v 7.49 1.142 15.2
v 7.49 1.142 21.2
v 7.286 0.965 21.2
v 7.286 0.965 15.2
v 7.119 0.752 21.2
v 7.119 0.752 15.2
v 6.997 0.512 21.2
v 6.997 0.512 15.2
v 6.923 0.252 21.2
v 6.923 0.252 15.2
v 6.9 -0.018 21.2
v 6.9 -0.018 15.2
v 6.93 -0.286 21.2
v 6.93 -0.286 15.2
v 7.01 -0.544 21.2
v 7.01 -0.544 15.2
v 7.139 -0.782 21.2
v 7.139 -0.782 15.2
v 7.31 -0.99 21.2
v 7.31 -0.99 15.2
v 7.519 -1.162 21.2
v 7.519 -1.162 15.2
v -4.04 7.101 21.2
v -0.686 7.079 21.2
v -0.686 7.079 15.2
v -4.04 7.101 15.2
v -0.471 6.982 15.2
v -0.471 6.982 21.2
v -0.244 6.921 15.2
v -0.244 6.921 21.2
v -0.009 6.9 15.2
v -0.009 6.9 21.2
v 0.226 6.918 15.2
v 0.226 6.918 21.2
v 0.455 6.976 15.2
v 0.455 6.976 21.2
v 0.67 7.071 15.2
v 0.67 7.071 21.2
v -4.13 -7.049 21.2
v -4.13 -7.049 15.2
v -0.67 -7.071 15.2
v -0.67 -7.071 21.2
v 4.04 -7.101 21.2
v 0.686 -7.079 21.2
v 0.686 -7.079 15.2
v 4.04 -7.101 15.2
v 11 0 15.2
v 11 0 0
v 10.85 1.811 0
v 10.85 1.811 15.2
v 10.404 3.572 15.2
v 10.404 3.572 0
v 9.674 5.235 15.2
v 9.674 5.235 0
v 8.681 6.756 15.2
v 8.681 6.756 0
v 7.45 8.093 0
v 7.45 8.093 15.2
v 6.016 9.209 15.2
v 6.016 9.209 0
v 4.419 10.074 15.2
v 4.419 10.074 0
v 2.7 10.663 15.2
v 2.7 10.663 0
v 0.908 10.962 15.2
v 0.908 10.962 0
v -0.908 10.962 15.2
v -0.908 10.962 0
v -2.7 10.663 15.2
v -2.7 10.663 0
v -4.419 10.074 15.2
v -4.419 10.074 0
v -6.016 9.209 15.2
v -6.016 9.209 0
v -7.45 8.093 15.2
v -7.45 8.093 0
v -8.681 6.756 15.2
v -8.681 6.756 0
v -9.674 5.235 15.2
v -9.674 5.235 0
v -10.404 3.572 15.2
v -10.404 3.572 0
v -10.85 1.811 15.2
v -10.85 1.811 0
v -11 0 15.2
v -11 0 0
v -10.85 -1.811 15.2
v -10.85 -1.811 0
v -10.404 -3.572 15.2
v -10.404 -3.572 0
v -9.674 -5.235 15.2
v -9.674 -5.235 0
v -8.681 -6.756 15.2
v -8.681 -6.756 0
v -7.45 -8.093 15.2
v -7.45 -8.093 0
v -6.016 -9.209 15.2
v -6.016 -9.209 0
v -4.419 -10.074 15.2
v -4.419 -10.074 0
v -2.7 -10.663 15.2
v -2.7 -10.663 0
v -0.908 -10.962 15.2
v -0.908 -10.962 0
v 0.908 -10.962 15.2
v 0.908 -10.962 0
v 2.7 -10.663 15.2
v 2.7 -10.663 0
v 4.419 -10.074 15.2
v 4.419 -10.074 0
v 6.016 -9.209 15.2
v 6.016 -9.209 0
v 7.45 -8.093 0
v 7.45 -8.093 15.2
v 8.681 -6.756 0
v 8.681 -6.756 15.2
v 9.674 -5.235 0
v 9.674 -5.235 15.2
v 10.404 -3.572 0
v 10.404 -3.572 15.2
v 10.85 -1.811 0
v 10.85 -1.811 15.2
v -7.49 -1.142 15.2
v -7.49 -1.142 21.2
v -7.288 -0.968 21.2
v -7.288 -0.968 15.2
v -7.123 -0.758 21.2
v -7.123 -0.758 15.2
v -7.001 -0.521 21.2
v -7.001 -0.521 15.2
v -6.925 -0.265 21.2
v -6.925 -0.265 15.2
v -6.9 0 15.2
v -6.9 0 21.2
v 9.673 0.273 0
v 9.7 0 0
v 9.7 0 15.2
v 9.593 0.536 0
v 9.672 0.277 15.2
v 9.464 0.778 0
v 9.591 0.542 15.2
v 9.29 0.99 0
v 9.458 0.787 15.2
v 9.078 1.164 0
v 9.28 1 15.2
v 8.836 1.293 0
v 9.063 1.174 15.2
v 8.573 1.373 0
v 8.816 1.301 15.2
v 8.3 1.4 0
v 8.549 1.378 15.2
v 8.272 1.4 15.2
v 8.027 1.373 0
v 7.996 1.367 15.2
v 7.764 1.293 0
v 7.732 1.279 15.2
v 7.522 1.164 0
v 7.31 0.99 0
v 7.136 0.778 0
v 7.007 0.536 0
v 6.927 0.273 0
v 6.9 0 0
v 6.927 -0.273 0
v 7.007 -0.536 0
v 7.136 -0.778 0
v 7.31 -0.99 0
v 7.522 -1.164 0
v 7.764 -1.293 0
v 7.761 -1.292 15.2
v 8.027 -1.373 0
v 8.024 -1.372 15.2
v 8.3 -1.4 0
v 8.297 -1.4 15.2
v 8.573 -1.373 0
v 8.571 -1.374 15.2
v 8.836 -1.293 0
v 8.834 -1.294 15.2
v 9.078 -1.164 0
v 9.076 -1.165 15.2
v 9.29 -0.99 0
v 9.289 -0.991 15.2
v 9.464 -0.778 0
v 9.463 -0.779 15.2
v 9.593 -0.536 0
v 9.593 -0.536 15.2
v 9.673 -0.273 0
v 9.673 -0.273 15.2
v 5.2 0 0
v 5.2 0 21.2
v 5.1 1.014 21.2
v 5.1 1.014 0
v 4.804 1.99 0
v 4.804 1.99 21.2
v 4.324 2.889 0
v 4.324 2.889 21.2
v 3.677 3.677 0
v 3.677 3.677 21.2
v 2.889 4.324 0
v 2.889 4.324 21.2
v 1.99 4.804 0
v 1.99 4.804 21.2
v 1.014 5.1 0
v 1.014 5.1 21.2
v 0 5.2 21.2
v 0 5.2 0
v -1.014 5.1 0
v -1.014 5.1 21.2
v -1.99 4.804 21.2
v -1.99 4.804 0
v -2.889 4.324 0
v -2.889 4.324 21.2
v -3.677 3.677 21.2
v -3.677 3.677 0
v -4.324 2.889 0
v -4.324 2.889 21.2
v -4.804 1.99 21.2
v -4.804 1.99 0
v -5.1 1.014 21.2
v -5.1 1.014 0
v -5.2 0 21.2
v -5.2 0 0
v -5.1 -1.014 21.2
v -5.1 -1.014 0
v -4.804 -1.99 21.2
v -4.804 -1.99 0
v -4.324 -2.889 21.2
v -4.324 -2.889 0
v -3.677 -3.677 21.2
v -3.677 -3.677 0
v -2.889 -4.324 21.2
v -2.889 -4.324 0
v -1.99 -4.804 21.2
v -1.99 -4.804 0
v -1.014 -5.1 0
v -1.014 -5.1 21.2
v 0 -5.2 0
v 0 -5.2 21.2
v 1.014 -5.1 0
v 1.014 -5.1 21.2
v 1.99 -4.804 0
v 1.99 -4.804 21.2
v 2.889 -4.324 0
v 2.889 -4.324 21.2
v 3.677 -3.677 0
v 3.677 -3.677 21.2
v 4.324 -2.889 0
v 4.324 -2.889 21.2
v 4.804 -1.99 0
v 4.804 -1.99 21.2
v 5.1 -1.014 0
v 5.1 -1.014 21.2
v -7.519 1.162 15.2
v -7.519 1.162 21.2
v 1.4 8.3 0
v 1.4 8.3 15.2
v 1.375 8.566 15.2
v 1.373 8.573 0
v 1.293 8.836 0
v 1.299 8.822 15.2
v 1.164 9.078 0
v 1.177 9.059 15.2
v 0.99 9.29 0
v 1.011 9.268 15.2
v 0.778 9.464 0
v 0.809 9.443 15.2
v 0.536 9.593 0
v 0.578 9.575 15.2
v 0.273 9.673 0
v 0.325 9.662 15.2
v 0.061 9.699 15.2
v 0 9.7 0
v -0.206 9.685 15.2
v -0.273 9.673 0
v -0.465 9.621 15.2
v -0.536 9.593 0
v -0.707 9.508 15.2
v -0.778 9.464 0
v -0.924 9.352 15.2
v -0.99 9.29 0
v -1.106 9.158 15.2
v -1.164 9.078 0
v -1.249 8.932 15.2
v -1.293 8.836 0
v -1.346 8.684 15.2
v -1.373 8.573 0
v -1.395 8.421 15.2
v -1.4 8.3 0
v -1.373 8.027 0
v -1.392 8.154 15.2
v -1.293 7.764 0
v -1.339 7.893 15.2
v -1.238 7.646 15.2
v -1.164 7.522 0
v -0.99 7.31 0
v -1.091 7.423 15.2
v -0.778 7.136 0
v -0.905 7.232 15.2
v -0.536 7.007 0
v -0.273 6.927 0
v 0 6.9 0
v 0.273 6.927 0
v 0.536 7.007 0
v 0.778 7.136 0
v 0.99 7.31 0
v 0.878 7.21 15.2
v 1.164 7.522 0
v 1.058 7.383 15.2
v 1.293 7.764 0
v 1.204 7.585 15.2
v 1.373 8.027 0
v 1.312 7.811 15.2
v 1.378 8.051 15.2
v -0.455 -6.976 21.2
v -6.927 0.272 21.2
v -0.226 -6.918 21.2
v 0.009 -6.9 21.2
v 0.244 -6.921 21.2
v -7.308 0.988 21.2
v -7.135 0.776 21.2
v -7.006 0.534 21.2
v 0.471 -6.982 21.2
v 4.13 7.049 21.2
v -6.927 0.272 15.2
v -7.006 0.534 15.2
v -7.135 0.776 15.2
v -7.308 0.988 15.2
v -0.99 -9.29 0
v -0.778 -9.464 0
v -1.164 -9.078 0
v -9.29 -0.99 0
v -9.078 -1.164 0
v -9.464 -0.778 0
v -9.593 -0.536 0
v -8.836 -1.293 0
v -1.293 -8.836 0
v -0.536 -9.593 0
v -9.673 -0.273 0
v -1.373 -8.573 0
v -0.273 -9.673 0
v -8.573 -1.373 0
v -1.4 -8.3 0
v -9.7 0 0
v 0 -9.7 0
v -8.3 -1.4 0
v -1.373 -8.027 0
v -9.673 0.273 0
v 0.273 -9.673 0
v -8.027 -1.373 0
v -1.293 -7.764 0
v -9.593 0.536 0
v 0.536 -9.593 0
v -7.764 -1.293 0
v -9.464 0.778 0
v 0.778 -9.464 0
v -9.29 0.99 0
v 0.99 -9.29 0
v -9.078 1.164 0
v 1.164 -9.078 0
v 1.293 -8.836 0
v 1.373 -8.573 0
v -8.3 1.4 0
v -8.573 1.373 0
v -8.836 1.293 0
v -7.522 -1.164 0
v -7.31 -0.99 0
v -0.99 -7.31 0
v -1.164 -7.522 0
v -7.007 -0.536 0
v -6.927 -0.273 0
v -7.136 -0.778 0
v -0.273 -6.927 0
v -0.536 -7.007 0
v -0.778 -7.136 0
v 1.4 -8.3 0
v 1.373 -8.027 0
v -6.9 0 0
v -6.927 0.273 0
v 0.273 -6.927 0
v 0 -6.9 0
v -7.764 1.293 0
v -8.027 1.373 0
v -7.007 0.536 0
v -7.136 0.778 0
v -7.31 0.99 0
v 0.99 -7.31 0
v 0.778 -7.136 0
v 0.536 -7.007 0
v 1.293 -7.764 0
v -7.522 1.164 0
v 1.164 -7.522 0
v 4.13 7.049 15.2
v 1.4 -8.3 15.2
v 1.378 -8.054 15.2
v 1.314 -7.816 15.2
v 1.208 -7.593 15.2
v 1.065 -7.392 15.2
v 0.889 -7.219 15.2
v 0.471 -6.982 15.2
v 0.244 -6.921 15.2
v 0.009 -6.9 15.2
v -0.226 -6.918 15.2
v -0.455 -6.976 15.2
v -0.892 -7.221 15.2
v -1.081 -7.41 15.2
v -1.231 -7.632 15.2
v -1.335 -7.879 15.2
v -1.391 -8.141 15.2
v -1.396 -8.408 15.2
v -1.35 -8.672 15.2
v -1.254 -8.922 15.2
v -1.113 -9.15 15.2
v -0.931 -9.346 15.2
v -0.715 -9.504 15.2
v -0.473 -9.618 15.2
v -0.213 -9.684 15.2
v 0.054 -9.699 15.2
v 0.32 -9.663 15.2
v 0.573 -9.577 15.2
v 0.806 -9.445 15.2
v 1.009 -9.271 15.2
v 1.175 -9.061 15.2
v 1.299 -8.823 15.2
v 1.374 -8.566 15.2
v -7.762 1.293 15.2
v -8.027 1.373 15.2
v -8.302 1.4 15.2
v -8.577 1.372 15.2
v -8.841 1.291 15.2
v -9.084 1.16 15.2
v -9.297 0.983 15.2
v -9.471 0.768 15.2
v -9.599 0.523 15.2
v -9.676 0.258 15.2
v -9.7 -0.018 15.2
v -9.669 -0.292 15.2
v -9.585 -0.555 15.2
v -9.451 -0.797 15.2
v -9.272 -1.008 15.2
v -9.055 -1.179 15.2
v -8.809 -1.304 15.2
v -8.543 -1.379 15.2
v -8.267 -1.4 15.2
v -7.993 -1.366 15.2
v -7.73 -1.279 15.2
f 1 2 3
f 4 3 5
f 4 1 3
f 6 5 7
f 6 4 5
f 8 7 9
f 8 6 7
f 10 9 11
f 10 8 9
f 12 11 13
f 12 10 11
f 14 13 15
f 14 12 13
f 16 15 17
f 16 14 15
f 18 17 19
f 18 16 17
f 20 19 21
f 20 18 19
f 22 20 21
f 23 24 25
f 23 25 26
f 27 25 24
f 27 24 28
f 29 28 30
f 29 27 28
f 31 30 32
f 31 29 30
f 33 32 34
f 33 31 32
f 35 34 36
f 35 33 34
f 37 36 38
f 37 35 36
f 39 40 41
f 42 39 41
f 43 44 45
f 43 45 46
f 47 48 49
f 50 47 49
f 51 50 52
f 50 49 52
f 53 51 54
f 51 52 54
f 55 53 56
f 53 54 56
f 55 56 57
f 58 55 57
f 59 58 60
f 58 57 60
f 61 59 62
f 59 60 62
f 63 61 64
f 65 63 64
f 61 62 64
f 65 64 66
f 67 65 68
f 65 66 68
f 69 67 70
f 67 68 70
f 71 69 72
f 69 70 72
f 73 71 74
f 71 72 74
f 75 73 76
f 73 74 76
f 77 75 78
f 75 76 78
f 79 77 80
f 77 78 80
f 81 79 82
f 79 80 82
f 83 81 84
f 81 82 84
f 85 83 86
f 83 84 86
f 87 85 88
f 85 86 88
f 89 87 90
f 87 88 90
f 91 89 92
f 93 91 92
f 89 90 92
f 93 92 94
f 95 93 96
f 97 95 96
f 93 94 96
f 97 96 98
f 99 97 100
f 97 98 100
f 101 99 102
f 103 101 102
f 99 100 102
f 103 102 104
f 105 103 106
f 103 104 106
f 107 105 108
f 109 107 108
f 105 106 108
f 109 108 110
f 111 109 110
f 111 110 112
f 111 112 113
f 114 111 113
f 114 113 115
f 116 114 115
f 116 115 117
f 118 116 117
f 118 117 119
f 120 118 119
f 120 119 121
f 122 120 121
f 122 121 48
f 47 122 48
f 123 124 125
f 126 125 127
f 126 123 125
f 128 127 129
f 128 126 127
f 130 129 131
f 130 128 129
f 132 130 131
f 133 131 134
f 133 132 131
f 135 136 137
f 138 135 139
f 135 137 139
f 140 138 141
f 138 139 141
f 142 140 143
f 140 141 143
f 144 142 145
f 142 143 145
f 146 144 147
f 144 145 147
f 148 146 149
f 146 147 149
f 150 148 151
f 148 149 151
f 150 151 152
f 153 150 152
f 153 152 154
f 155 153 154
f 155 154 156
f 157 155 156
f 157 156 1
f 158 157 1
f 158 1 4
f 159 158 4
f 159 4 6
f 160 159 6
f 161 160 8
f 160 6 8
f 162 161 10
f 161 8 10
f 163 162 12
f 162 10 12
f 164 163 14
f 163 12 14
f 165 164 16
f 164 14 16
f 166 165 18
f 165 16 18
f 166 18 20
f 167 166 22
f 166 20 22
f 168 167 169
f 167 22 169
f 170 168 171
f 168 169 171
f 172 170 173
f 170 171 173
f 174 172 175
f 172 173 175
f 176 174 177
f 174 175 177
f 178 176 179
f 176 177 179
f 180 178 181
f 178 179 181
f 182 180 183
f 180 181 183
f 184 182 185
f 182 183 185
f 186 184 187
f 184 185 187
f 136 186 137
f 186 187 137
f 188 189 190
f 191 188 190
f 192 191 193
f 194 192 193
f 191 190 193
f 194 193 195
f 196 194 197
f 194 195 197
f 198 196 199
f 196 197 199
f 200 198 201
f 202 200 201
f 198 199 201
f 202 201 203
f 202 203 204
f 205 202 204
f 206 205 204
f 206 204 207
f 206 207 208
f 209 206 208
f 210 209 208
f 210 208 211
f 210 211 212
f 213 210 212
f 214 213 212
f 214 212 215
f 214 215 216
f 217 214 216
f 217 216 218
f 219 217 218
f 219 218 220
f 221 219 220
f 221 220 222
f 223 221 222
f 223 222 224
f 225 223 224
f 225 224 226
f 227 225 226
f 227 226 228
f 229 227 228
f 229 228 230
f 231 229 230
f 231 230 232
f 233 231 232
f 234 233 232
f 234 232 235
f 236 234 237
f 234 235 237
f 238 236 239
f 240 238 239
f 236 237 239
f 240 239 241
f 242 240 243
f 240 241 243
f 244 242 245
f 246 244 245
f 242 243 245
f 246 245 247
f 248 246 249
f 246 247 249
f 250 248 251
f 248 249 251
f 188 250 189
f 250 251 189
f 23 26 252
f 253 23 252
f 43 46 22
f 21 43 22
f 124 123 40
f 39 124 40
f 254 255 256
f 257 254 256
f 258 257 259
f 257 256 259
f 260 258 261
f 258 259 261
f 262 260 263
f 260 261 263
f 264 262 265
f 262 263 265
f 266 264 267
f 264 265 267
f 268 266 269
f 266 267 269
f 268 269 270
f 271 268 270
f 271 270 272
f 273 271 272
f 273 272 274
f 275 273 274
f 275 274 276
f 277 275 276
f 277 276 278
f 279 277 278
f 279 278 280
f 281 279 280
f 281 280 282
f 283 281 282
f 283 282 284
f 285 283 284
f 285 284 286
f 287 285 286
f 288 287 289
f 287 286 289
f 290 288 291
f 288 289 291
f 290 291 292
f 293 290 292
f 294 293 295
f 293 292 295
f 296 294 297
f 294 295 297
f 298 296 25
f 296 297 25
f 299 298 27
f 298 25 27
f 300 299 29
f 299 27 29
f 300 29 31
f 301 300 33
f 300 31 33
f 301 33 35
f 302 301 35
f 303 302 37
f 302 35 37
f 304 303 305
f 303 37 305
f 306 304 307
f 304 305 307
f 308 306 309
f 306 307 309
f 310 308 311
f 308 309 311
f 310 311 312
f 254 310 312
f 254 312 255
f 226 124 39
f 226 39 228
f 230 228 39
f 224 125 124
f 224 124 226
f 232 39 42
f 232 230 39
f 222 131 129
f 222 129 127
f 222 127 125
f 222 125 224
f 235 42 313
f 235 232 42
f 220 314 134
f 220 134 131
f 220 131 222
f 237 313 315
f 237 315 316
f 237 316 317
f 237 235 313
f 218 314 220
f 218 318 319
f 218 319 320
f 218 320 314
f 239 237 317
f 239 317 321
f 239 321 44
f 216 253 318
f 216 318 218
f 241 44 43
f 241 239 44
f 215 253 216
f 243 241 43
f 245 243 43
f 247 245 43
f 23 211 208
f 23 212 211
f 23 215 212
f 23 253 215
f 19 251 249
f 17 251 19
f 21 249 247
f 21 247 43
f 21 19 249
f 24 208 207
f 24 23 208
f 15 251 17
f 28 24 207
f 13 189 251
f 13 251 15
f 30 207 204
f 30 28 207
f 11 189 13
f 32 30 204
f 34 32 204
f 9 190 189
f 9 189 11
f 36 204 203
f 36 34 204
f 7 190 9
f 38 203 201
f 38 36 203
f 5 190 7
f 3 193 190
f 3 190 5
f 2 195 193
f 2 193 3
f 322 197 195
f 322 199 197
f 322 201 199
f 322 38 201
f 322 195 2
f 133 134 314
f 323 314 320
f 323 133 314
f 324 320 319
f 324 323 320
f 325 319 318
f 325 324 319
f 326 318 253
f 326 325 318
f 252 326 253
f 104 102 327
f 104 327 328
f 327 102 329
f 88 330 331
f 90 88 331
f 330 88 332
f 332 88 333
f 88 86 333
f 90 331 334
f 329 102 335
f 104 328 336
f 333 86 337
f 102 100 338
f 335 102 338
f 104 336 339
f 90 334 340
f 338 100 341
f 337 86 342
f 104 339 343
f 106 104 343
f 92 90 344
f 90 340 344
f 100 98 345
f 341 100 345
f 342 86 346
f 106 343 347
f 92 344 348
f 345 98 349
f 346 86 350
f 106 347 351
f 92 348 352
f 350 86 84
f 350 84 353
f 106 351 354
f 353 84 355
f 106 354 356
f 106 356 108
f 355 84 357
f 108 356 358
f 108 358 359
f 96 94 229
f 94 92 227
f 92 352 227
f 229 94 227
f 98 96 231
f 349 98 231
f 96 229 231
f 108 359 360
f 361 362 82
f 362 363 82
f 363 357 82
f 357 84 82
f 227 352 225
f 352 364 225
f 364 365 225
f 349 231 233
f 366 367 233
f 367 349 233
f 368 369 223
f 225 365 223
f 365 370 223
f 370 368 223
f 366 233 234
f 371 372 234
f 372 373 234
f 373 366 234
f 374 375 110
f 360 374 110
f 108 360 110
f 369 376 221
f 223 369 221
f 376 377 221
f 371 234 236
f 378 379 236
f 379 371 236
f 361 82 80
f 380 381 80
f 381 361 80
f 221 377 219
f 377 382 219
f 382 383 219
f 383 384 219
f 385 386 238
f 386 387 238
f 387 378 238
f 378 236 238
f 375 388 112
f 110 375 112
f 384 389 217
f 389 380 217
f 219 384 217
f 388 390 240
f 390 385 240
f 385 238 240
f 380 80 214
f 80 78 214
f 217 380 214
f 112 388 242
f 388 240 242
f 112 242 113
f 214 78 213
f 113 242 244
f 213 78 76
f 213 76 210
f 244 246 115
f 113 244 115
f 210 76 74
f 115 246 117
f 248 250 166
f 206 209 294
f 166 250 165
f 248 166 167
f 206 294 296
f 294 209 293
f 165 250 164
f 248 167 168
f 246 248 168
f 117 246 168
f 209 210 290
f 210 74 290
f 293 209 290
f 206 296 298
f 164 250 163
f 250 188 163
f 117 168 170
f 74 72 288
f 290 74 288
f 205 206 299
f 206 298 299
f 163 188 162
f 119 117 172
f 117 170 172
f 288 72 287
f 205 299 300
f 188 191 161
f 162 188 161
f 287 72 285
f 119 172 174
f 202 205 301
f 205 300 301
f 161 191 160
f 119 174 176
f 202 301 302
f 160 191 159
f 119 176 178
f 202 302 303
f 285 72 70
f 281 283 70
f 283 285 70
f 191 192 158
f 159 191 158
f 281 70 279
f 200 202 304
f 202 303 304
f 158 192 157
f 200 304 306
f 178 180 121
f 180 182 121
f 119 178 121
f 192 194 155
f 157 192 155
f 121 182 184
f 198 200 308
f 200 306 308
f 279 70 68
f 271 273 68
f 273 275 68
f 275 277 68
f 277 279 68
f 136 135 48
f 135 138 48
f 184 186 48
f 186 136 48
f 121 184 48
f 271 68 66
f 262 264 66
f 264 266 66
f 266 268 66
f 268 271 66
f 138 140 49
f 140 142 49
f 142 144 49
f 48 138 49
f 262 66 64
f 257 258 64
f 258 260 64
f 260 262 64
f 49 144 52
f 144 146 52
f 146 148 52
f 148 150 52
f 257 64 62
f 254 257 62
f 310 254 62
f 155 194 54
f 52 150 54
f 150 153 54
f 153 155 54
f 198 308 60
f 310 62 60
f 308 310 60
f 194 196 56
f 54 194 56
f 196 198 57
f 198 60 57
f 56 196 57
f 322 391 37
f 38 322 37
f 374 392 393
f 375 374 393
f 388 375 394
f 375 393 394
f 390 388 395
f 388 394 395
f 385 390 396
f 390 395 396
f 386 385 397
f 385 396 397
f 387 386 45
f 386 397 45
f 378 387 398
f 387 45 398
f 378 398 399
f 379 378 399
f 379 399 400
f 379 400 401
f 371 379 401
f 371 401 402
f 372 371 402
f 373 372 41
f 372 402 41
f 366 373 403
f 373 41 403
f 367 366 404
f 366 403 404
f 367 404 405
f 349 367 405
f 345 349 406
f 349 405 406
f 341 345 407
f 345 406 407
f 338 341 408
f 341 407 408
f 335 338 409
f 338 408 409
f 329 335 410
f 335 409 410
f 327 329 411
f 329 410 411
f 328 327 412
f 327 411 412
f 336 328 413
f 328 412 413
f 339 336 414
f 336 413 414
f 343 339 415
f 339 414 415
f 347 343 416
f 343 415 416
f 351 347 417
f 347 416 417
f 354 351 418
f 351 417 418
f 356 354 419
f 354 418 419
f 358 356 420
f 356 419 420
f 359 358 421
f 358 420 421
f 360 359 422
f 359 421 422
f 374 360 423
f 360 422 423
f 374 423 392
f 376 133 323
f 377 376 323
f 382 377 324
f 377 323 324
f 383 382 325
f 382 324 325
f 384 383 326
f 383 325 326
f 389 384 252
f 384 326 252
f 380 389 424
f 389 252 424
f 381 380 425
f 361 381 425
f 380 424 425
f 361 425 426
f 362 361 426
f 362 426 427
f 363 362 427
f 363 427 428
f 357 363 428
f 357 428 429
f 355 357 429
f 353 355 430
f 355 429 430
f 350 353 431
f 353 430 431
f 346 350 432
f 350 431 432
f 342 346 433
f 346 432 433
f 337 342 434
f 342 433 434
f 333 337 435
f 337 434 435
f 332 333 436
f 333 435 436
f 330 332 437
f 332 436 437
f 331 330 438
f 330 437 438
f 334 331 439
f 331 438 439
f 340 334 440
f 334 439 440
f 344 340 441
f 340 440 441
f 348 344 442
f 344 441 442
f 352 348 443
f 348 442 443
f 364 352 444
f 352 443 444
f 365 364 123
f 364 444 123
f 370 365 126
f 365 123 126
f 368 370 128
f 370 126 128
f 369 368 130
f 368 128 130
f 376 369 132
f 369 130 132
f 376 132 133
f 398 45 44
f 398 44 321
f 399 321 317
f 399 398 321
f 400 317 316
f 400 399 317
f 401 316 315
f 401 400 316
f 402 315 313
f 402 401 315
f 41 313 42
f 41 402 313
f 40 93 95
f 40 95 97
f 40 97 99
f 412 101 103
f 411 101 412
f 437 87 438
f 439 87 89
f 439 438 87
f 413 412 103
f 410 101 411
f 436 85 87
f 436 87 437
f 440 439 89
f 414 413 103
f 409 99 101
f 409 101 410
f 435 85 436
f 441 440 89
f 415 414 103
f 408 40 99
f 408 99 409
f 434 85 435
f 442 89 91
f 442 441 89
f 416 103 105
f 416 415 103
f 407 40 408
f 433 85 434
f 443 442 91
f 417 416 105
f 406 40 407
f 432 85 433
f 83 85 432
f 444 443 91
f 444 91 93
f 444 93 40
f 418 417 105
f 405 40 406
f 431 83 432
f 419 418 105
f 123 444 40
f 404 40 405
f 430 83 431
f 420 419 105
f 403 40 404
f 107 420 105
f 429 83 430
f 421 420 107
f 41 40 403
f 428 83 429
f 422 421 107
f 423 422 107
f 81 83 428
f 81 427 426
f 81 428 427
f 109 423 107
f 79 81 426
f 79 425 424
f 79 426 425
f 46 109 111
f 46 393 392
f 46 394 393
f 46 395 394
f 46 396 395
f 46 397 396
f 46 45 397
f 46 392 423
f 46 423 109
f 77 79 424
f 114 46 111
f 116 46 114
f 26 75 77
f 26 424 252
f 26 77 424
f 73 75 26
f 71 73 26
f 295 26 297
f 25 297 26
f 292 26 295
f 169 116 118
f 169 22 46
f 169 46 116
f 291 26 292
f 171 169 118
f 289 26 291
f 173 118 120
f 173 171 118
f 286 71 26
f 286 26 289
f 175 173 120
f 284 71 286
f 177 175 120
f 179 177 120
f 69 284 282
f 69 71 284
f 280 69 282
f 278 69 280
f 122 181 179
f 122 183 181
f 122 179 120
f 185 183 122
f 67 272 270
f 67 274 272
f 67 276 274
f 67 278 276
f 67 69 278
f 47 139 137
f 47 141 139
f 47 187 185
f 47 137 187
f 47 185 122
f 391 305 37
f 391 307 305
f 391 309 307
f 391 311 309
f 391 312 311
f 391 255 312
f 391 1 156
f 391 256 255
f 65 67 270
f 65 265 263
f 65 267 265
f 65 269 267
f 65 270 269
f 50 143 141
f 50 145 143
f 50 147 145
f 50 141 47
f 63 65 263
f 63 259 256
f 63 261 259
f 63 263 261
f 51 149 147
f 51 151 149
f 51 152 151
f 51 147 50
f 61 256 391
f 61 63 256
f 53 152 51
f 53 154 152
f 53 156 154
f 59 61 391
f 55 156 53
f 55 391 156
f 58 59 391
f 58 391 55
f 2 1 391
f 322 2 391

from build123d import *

# Parameters (mm, degrees)
F0_R          = 11
F1_DEPTH      = 15.2
F2_R          = 5.1
F3_DEPTH      = 50
F3_DEPTH_BACK = 50
F4_R          = 1.4
F5_DEPTH      = 25
F7_DEPTH      = 6
F8_R          = 5.2
F9_DEPTH      = 50
F10_DEPTH     = 25


with BuildPart() as f1:
    # F0 (on Top) → F1 (new body)
    with BuildSketch(Plane.XY):
        Circle(F0_R)
    extrude(amount=F1_DEPTH)

    # F2 (on face) → F3 (cut, two sides)
    with BuildSketch(Plane.XY.offset(15.2)) as f3_sk:
        Circle(F2_R)
    extrude(amount=-F3_DEPTH, mode=Mode.SUBTRACT)
    extrude(f3_sk.sketch, amount=-F3_DEPTH_BACK, mode=Mode.SUBTRACT)

    # F4 (on face) → F5 (cut)
    with BuildSketch(Plane.XY.offset(15.2)):
        with Locations((0, -8.3)):
            Circle(F4_R)
        with Locations((-8.3, 0)):
            Circle(F4_R)
        with Locations((0, 8.3)):
            Circle(F4_R)
        with Locations((8.3, 0)):
            Circle(F4_R)
    extrude(amount=-F5_DEPTH, mode=Mode.SUBTRACT)

    # F6 (on face) → F7 (join)
    with BuildSketch(Plane.XY.offset(15.2)):
        Polygon((4.039756, -7.100789), (8.169342, -0.051863), (4.129585, 7.048926), (-4.039756, 7.100789), (-8.169342, 0.051863), (-4.129585, -7.048926), align=None)
    extrude(amount=F7_DEPTH)

    # F8 (on face) → F9 (cut)
    with BuildSketch(Plane.XY.offset(21.2)):
        Circle(F8_R)
    extrude(amount=-F9_DEPTH, mode=Mode.SUBTRACT)

    # F4 (on face) → F10 (cut)
    with BuildSketch(Plane.XY.offset(15.2)):
        with Locations((-8.3, 0)):
            Circle(F4_R)
        with Locations((8.3, 0)):
            Circle(F4_R)
        with Locations((0, 8.3)):
            Circle(F4_R)
        with Locations((0, -8.3)):
            Circle(F4_R)
    extrude(amount=F10_DEPTH, mode=Mode.SUBTRACT)


solid = f1.part
